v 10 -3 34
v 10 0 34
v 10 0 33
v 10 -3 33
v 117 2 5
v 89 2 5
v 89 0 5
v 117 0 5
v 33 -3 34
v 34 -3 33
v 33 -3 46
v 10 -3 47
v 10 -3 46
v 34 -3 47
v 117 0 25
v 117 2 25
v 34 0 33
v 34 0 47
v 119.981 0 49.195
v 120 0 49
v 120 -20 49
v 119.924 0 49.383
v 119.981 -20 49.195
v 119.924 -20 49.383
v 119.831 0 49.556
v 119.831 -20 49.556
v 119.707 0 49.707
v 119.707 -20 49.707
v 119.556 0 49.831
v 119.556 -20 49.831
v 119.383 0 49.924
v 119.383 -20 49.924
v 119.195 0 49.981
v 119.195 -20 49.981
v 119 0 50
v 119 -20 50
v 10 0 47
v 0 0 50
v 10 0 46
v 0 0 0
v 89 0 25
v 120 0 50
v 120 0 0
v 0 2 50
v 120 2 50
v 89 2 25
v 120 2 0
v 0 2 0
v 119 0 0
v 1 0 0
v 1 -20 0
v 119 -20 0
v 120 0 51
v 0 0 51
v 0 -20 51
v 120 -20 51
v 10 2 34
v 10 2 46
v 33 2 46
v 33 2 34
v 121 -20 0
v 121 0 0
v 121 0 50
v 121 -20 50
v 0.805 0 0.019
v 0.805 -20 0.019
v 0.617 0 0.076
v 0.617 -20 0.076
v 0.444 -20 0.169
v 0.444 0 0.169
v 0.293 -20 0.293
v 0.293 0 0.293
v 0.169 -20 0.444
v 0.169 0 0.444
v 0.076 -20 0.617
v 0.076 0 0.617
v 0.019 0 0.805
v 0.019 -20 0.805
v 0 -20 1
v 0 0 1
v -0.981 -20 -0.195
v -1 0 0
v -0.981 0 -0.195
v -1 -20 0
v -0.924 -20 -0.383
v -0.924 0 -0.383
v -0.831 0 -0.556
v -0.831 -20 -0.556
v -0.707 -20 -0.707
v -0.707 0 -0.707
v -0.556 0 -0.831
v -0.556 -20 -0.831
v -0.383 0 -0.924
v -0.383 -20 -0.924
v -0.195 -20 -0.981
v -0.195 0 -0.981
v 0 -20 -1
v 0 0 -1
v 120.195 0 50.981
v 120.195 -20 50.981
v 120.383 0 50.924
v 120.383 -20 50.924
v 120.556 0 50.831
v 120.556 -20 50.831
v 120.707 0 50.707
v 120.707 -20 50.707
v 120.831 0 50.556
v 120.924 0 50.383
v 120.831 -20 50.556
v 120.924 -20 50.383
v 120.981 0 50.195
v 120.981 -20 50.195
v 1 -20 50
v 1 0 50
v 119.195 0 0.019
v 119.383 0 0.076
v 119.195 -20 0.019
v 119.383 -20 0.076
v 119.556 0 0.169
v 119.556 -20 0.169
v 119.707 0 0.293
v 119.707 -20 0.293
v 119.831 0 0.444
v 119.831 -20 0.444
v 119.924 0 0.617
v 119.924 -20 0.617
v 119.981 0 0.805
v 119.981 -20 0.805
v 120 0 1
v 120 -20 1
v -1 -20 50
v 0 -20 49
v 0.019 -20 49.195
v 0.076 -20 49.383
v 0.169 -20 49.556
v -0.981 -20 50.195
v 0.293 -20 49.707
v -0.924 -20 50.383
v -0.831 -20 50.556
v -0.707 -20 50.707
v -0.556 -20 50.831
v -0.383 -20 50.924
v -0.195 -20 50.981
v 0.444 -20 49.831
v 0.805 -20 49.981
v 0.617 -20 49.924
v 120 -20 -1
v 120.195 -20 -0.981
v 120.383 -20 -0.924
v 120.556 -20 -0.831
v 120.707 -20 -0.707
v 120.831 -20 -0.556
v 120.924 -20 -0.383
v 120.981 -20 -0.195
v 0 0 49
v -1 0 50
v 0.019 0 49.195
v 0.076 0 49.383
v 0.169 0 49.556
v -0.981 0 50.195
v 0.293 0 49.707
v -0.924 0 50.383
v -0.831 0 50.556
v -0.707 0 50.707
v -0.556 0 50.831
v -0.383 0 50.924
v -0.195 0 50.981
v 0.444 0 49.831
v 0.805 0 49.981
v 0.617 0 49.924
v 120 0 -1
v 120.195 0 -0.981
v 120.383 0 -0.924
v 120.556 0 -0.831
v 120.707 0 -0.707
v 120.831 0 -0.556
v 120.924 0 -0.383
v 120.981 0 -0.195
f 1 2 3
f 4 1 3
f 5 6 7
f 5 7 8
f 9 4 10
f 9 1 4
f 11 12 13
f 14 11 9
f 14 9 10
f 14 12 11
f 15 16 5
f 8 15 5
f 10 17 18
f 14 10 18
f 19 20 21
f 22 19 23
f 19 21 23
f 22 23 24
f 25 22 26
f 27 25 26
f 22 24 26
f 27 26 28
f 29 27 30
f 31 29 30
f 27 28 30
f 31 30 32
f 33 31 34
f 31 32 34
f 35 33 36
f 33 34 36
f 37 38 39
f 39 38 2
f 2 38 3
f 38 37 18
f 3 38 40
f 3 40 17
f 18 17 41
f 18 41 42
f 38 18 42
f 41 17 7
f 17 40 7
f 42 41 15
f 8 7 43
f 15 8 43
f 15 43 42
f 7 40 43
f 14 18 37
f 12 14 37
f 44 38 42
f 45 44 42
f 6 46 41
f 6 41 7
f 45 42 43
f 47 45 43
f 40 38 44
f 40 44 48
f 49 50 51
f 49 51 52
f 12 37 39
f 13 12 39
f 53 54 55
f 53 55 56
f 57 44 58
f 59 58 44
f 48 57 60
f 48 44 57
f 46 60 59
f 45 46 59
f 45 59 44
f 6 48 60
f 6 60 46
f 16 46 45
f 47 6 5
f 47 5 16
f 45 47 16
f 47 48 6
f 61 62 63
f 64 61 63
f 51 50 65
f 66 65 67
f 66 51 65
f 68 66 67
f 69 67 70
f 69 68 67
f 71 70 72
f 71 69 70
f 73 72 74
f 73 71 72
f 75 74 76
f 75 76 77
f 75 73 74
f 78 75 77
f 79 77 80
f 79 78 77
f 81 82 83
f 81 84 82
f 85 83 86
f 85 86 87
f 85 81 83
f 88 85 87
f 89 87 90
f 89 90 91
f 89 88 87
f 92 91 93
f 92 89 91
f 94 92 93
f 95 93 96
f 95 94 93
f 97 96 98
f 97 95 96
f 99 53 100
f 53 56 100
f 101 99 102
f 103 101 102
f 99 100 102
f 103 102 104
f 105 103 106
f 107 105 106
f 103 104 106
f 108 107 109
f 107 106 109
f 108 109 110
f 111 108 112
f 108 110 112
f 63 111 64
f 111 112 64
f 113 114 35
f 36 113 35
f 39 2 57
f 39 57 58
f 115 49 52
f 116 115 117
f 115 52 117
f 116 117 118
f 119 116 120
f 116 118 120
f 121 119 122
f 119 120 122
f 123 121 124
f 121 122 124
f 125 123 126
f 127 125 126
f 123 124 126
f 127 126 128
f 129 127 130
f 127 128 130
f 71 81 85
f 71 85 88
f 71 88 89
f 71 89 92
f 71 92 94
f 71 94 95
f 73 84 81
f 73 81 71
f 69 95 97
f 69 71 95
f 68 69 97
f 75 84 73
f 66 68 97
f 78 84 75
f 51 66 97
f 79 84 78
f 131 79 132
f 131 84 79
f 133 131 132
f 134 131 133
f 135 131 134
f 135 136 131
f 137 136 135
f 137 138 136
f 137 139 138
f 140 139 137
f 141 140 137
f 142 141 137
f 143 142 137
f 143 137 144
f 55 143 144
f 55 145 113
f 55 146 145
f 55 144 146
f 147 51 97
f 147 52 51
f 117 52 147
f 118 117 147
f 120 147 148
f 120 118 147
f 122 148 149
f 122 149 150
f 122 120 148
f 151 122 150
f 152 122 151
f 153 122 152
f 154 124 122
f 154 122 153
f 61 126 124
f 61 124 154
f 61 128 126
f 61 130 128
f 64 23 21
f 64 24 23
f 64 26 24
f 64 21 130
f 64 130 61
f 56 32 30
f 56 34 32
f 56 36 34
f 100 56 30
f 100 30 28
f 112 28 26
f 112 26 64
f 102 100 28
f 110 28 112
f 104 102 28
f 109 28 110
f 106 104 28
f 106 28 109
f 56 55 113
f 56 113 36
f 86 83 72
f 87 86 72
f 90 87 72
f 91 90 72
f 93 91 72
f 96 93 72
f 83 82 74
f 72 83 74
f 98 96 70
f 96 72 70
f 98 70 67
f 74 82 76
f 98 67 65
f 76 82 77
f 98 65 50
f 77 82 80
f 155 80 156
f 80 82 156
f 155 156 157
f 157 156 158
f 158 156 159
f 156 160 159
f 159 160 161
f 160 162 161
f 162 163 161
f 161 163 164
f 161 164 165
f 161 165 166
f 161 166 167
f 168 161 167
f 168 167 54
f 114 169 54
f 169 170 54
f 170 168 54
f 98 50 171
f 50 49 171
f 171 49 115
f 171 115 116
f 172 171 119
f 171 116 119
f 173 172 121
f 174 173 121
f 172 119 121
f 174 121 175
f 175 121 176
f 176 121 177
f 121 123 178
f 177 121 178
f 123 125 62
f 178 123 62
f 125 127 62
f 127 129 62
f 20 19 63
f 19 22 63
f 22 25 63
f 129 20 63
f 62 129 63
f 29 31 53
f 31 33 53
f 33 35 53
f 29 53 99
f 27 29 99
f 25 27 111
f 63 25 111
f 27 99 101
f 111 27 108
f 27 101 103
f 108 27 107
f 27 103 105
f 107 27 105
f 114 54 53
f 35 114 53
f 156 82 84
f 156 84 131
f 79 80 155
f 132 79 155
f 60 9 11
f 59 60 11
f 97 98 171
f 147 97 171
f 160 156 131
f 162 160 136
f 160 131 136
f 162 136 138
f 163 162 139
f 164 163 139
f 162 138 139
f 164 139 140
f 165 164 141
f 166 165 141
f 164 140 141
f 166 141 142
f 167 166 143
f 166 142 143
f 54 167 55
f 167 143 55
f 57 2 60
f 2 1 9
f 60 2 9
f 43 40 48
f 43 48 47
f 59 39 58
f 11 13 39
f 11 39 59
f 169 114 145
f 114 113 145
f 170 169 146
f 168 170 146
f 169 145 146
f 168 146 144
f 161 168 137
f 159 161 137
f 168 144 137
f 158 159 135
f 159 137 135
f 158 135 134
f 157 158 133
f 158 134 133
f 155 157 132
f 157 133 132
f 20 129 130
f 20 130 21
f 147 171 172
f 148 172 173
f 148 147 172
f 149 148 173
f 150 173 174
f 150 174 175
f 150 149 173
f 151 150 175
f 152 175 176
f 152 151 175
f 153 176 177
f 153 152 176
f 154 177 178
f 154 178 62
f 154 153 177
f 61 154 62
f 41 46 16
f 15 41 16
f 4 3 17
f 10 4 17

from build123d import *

# Parameters (mm, degrees)
SKETCH_1_W          = 120
SKETCH_1_H          = 50
EXTRUDE_1_DEPTH     = 2
SKETCH_2_W          = 122
SKETCH_2_H          = 52
SKETCH_2_W_2        = 120
SKETCH_2_H_2        = 50
EXTRUDE_2_DEPTH     = 20
SKETCH_3_W          = 28
SKETCH_3_H          = 20
CUT_EXTRUDE_1_DEPTH = 2
FILLET_2_R          = 1
EXTRUDE_2_2_DEPTH   = 3
SKETCH_6_W          = 23
SKETCH_6_H          = 12
CUT_EXTRUDE_2_DEPTH = 2


with BuildPart() as part:
    # 草图1 → 凸台-拉伸1 (new body)
    with BuildSketch(Plane(origin=(0, 0, 0), x_dir=(1, 0, 0), z_dir=(0, 1, 0))):
        with Locations((60, -25)):
            Rectangle(SKETCH_1_W, SKETCH_1_H)
    extrude(amount=EXTRUDE_1_DEPTH)

    # 草图3 → 切除-拉伸1 (cut)
    with BuildSketch(Plane(origin=(0, 2, 0), x_dir=(1, 0, 0), z_dir=(0, 1, 0))):
        with Locations((103, -15)):
            Rectangle(SKETCH_3_W, SKETCH_3_H)
    extrude(amount=-CUT_EXTRUDE_1_DEPTH, mode=Mode.SUBTRACT)

    # 草图5 → Extrude 2 2 (add)
    with BuildSketch(Plane.XZ):
        Polygon((10, 33), (34, 33), (34, 47), (10, 47), (10, 46), (33, 46), (33, 34), (10, 34), align=None)
    extrude(amount=EXTRUDE_2_2_DEPTH)

    # 草图6 → 切除-拉伸2 (cut)
    with BuildSketch(Plane.XZ):
        with Locations((21.5, 40)):
            Rectangle(SKETCH_6_W, SKETCH_6_H)
    extrude(amount=-CUT_EXTRUDE_2_DEPTH, mode=Mode.SUBTRACT)


with BuildPart() as body_2:
    # 草图2 → Extrude 2 (new body)
    with BuildSketch(Plane.XZ):
        with Locations((60, 25)):
            Rectangle(SKETCH_2_W, SKETCH_2_H)
        with Locations((60, 25)):
            Rectangle(SKETCH_2_W_2, SKETCH_2_H_2, mode=Mode.SUBTRACT)
    extrude(amount=EXTRUDE_2_DEPTH)

    # 圆角2
    fillet_2_edges = [body_2.edges().sort_by_distance(p)[0] for p in [
        (120, -10, 0),
        (120, -10, 50),
        (0, -10, 50),
        (0, -10, 0),
        (121, -10, -1),
        (-1, -10, -1),
        (-1, -10, 51),
        (121, -10, 51),
    ]]
    fillet(fillet_2_edges, radius=FILLET_2_R)


solid = Compound([part.part, body_2.part])
